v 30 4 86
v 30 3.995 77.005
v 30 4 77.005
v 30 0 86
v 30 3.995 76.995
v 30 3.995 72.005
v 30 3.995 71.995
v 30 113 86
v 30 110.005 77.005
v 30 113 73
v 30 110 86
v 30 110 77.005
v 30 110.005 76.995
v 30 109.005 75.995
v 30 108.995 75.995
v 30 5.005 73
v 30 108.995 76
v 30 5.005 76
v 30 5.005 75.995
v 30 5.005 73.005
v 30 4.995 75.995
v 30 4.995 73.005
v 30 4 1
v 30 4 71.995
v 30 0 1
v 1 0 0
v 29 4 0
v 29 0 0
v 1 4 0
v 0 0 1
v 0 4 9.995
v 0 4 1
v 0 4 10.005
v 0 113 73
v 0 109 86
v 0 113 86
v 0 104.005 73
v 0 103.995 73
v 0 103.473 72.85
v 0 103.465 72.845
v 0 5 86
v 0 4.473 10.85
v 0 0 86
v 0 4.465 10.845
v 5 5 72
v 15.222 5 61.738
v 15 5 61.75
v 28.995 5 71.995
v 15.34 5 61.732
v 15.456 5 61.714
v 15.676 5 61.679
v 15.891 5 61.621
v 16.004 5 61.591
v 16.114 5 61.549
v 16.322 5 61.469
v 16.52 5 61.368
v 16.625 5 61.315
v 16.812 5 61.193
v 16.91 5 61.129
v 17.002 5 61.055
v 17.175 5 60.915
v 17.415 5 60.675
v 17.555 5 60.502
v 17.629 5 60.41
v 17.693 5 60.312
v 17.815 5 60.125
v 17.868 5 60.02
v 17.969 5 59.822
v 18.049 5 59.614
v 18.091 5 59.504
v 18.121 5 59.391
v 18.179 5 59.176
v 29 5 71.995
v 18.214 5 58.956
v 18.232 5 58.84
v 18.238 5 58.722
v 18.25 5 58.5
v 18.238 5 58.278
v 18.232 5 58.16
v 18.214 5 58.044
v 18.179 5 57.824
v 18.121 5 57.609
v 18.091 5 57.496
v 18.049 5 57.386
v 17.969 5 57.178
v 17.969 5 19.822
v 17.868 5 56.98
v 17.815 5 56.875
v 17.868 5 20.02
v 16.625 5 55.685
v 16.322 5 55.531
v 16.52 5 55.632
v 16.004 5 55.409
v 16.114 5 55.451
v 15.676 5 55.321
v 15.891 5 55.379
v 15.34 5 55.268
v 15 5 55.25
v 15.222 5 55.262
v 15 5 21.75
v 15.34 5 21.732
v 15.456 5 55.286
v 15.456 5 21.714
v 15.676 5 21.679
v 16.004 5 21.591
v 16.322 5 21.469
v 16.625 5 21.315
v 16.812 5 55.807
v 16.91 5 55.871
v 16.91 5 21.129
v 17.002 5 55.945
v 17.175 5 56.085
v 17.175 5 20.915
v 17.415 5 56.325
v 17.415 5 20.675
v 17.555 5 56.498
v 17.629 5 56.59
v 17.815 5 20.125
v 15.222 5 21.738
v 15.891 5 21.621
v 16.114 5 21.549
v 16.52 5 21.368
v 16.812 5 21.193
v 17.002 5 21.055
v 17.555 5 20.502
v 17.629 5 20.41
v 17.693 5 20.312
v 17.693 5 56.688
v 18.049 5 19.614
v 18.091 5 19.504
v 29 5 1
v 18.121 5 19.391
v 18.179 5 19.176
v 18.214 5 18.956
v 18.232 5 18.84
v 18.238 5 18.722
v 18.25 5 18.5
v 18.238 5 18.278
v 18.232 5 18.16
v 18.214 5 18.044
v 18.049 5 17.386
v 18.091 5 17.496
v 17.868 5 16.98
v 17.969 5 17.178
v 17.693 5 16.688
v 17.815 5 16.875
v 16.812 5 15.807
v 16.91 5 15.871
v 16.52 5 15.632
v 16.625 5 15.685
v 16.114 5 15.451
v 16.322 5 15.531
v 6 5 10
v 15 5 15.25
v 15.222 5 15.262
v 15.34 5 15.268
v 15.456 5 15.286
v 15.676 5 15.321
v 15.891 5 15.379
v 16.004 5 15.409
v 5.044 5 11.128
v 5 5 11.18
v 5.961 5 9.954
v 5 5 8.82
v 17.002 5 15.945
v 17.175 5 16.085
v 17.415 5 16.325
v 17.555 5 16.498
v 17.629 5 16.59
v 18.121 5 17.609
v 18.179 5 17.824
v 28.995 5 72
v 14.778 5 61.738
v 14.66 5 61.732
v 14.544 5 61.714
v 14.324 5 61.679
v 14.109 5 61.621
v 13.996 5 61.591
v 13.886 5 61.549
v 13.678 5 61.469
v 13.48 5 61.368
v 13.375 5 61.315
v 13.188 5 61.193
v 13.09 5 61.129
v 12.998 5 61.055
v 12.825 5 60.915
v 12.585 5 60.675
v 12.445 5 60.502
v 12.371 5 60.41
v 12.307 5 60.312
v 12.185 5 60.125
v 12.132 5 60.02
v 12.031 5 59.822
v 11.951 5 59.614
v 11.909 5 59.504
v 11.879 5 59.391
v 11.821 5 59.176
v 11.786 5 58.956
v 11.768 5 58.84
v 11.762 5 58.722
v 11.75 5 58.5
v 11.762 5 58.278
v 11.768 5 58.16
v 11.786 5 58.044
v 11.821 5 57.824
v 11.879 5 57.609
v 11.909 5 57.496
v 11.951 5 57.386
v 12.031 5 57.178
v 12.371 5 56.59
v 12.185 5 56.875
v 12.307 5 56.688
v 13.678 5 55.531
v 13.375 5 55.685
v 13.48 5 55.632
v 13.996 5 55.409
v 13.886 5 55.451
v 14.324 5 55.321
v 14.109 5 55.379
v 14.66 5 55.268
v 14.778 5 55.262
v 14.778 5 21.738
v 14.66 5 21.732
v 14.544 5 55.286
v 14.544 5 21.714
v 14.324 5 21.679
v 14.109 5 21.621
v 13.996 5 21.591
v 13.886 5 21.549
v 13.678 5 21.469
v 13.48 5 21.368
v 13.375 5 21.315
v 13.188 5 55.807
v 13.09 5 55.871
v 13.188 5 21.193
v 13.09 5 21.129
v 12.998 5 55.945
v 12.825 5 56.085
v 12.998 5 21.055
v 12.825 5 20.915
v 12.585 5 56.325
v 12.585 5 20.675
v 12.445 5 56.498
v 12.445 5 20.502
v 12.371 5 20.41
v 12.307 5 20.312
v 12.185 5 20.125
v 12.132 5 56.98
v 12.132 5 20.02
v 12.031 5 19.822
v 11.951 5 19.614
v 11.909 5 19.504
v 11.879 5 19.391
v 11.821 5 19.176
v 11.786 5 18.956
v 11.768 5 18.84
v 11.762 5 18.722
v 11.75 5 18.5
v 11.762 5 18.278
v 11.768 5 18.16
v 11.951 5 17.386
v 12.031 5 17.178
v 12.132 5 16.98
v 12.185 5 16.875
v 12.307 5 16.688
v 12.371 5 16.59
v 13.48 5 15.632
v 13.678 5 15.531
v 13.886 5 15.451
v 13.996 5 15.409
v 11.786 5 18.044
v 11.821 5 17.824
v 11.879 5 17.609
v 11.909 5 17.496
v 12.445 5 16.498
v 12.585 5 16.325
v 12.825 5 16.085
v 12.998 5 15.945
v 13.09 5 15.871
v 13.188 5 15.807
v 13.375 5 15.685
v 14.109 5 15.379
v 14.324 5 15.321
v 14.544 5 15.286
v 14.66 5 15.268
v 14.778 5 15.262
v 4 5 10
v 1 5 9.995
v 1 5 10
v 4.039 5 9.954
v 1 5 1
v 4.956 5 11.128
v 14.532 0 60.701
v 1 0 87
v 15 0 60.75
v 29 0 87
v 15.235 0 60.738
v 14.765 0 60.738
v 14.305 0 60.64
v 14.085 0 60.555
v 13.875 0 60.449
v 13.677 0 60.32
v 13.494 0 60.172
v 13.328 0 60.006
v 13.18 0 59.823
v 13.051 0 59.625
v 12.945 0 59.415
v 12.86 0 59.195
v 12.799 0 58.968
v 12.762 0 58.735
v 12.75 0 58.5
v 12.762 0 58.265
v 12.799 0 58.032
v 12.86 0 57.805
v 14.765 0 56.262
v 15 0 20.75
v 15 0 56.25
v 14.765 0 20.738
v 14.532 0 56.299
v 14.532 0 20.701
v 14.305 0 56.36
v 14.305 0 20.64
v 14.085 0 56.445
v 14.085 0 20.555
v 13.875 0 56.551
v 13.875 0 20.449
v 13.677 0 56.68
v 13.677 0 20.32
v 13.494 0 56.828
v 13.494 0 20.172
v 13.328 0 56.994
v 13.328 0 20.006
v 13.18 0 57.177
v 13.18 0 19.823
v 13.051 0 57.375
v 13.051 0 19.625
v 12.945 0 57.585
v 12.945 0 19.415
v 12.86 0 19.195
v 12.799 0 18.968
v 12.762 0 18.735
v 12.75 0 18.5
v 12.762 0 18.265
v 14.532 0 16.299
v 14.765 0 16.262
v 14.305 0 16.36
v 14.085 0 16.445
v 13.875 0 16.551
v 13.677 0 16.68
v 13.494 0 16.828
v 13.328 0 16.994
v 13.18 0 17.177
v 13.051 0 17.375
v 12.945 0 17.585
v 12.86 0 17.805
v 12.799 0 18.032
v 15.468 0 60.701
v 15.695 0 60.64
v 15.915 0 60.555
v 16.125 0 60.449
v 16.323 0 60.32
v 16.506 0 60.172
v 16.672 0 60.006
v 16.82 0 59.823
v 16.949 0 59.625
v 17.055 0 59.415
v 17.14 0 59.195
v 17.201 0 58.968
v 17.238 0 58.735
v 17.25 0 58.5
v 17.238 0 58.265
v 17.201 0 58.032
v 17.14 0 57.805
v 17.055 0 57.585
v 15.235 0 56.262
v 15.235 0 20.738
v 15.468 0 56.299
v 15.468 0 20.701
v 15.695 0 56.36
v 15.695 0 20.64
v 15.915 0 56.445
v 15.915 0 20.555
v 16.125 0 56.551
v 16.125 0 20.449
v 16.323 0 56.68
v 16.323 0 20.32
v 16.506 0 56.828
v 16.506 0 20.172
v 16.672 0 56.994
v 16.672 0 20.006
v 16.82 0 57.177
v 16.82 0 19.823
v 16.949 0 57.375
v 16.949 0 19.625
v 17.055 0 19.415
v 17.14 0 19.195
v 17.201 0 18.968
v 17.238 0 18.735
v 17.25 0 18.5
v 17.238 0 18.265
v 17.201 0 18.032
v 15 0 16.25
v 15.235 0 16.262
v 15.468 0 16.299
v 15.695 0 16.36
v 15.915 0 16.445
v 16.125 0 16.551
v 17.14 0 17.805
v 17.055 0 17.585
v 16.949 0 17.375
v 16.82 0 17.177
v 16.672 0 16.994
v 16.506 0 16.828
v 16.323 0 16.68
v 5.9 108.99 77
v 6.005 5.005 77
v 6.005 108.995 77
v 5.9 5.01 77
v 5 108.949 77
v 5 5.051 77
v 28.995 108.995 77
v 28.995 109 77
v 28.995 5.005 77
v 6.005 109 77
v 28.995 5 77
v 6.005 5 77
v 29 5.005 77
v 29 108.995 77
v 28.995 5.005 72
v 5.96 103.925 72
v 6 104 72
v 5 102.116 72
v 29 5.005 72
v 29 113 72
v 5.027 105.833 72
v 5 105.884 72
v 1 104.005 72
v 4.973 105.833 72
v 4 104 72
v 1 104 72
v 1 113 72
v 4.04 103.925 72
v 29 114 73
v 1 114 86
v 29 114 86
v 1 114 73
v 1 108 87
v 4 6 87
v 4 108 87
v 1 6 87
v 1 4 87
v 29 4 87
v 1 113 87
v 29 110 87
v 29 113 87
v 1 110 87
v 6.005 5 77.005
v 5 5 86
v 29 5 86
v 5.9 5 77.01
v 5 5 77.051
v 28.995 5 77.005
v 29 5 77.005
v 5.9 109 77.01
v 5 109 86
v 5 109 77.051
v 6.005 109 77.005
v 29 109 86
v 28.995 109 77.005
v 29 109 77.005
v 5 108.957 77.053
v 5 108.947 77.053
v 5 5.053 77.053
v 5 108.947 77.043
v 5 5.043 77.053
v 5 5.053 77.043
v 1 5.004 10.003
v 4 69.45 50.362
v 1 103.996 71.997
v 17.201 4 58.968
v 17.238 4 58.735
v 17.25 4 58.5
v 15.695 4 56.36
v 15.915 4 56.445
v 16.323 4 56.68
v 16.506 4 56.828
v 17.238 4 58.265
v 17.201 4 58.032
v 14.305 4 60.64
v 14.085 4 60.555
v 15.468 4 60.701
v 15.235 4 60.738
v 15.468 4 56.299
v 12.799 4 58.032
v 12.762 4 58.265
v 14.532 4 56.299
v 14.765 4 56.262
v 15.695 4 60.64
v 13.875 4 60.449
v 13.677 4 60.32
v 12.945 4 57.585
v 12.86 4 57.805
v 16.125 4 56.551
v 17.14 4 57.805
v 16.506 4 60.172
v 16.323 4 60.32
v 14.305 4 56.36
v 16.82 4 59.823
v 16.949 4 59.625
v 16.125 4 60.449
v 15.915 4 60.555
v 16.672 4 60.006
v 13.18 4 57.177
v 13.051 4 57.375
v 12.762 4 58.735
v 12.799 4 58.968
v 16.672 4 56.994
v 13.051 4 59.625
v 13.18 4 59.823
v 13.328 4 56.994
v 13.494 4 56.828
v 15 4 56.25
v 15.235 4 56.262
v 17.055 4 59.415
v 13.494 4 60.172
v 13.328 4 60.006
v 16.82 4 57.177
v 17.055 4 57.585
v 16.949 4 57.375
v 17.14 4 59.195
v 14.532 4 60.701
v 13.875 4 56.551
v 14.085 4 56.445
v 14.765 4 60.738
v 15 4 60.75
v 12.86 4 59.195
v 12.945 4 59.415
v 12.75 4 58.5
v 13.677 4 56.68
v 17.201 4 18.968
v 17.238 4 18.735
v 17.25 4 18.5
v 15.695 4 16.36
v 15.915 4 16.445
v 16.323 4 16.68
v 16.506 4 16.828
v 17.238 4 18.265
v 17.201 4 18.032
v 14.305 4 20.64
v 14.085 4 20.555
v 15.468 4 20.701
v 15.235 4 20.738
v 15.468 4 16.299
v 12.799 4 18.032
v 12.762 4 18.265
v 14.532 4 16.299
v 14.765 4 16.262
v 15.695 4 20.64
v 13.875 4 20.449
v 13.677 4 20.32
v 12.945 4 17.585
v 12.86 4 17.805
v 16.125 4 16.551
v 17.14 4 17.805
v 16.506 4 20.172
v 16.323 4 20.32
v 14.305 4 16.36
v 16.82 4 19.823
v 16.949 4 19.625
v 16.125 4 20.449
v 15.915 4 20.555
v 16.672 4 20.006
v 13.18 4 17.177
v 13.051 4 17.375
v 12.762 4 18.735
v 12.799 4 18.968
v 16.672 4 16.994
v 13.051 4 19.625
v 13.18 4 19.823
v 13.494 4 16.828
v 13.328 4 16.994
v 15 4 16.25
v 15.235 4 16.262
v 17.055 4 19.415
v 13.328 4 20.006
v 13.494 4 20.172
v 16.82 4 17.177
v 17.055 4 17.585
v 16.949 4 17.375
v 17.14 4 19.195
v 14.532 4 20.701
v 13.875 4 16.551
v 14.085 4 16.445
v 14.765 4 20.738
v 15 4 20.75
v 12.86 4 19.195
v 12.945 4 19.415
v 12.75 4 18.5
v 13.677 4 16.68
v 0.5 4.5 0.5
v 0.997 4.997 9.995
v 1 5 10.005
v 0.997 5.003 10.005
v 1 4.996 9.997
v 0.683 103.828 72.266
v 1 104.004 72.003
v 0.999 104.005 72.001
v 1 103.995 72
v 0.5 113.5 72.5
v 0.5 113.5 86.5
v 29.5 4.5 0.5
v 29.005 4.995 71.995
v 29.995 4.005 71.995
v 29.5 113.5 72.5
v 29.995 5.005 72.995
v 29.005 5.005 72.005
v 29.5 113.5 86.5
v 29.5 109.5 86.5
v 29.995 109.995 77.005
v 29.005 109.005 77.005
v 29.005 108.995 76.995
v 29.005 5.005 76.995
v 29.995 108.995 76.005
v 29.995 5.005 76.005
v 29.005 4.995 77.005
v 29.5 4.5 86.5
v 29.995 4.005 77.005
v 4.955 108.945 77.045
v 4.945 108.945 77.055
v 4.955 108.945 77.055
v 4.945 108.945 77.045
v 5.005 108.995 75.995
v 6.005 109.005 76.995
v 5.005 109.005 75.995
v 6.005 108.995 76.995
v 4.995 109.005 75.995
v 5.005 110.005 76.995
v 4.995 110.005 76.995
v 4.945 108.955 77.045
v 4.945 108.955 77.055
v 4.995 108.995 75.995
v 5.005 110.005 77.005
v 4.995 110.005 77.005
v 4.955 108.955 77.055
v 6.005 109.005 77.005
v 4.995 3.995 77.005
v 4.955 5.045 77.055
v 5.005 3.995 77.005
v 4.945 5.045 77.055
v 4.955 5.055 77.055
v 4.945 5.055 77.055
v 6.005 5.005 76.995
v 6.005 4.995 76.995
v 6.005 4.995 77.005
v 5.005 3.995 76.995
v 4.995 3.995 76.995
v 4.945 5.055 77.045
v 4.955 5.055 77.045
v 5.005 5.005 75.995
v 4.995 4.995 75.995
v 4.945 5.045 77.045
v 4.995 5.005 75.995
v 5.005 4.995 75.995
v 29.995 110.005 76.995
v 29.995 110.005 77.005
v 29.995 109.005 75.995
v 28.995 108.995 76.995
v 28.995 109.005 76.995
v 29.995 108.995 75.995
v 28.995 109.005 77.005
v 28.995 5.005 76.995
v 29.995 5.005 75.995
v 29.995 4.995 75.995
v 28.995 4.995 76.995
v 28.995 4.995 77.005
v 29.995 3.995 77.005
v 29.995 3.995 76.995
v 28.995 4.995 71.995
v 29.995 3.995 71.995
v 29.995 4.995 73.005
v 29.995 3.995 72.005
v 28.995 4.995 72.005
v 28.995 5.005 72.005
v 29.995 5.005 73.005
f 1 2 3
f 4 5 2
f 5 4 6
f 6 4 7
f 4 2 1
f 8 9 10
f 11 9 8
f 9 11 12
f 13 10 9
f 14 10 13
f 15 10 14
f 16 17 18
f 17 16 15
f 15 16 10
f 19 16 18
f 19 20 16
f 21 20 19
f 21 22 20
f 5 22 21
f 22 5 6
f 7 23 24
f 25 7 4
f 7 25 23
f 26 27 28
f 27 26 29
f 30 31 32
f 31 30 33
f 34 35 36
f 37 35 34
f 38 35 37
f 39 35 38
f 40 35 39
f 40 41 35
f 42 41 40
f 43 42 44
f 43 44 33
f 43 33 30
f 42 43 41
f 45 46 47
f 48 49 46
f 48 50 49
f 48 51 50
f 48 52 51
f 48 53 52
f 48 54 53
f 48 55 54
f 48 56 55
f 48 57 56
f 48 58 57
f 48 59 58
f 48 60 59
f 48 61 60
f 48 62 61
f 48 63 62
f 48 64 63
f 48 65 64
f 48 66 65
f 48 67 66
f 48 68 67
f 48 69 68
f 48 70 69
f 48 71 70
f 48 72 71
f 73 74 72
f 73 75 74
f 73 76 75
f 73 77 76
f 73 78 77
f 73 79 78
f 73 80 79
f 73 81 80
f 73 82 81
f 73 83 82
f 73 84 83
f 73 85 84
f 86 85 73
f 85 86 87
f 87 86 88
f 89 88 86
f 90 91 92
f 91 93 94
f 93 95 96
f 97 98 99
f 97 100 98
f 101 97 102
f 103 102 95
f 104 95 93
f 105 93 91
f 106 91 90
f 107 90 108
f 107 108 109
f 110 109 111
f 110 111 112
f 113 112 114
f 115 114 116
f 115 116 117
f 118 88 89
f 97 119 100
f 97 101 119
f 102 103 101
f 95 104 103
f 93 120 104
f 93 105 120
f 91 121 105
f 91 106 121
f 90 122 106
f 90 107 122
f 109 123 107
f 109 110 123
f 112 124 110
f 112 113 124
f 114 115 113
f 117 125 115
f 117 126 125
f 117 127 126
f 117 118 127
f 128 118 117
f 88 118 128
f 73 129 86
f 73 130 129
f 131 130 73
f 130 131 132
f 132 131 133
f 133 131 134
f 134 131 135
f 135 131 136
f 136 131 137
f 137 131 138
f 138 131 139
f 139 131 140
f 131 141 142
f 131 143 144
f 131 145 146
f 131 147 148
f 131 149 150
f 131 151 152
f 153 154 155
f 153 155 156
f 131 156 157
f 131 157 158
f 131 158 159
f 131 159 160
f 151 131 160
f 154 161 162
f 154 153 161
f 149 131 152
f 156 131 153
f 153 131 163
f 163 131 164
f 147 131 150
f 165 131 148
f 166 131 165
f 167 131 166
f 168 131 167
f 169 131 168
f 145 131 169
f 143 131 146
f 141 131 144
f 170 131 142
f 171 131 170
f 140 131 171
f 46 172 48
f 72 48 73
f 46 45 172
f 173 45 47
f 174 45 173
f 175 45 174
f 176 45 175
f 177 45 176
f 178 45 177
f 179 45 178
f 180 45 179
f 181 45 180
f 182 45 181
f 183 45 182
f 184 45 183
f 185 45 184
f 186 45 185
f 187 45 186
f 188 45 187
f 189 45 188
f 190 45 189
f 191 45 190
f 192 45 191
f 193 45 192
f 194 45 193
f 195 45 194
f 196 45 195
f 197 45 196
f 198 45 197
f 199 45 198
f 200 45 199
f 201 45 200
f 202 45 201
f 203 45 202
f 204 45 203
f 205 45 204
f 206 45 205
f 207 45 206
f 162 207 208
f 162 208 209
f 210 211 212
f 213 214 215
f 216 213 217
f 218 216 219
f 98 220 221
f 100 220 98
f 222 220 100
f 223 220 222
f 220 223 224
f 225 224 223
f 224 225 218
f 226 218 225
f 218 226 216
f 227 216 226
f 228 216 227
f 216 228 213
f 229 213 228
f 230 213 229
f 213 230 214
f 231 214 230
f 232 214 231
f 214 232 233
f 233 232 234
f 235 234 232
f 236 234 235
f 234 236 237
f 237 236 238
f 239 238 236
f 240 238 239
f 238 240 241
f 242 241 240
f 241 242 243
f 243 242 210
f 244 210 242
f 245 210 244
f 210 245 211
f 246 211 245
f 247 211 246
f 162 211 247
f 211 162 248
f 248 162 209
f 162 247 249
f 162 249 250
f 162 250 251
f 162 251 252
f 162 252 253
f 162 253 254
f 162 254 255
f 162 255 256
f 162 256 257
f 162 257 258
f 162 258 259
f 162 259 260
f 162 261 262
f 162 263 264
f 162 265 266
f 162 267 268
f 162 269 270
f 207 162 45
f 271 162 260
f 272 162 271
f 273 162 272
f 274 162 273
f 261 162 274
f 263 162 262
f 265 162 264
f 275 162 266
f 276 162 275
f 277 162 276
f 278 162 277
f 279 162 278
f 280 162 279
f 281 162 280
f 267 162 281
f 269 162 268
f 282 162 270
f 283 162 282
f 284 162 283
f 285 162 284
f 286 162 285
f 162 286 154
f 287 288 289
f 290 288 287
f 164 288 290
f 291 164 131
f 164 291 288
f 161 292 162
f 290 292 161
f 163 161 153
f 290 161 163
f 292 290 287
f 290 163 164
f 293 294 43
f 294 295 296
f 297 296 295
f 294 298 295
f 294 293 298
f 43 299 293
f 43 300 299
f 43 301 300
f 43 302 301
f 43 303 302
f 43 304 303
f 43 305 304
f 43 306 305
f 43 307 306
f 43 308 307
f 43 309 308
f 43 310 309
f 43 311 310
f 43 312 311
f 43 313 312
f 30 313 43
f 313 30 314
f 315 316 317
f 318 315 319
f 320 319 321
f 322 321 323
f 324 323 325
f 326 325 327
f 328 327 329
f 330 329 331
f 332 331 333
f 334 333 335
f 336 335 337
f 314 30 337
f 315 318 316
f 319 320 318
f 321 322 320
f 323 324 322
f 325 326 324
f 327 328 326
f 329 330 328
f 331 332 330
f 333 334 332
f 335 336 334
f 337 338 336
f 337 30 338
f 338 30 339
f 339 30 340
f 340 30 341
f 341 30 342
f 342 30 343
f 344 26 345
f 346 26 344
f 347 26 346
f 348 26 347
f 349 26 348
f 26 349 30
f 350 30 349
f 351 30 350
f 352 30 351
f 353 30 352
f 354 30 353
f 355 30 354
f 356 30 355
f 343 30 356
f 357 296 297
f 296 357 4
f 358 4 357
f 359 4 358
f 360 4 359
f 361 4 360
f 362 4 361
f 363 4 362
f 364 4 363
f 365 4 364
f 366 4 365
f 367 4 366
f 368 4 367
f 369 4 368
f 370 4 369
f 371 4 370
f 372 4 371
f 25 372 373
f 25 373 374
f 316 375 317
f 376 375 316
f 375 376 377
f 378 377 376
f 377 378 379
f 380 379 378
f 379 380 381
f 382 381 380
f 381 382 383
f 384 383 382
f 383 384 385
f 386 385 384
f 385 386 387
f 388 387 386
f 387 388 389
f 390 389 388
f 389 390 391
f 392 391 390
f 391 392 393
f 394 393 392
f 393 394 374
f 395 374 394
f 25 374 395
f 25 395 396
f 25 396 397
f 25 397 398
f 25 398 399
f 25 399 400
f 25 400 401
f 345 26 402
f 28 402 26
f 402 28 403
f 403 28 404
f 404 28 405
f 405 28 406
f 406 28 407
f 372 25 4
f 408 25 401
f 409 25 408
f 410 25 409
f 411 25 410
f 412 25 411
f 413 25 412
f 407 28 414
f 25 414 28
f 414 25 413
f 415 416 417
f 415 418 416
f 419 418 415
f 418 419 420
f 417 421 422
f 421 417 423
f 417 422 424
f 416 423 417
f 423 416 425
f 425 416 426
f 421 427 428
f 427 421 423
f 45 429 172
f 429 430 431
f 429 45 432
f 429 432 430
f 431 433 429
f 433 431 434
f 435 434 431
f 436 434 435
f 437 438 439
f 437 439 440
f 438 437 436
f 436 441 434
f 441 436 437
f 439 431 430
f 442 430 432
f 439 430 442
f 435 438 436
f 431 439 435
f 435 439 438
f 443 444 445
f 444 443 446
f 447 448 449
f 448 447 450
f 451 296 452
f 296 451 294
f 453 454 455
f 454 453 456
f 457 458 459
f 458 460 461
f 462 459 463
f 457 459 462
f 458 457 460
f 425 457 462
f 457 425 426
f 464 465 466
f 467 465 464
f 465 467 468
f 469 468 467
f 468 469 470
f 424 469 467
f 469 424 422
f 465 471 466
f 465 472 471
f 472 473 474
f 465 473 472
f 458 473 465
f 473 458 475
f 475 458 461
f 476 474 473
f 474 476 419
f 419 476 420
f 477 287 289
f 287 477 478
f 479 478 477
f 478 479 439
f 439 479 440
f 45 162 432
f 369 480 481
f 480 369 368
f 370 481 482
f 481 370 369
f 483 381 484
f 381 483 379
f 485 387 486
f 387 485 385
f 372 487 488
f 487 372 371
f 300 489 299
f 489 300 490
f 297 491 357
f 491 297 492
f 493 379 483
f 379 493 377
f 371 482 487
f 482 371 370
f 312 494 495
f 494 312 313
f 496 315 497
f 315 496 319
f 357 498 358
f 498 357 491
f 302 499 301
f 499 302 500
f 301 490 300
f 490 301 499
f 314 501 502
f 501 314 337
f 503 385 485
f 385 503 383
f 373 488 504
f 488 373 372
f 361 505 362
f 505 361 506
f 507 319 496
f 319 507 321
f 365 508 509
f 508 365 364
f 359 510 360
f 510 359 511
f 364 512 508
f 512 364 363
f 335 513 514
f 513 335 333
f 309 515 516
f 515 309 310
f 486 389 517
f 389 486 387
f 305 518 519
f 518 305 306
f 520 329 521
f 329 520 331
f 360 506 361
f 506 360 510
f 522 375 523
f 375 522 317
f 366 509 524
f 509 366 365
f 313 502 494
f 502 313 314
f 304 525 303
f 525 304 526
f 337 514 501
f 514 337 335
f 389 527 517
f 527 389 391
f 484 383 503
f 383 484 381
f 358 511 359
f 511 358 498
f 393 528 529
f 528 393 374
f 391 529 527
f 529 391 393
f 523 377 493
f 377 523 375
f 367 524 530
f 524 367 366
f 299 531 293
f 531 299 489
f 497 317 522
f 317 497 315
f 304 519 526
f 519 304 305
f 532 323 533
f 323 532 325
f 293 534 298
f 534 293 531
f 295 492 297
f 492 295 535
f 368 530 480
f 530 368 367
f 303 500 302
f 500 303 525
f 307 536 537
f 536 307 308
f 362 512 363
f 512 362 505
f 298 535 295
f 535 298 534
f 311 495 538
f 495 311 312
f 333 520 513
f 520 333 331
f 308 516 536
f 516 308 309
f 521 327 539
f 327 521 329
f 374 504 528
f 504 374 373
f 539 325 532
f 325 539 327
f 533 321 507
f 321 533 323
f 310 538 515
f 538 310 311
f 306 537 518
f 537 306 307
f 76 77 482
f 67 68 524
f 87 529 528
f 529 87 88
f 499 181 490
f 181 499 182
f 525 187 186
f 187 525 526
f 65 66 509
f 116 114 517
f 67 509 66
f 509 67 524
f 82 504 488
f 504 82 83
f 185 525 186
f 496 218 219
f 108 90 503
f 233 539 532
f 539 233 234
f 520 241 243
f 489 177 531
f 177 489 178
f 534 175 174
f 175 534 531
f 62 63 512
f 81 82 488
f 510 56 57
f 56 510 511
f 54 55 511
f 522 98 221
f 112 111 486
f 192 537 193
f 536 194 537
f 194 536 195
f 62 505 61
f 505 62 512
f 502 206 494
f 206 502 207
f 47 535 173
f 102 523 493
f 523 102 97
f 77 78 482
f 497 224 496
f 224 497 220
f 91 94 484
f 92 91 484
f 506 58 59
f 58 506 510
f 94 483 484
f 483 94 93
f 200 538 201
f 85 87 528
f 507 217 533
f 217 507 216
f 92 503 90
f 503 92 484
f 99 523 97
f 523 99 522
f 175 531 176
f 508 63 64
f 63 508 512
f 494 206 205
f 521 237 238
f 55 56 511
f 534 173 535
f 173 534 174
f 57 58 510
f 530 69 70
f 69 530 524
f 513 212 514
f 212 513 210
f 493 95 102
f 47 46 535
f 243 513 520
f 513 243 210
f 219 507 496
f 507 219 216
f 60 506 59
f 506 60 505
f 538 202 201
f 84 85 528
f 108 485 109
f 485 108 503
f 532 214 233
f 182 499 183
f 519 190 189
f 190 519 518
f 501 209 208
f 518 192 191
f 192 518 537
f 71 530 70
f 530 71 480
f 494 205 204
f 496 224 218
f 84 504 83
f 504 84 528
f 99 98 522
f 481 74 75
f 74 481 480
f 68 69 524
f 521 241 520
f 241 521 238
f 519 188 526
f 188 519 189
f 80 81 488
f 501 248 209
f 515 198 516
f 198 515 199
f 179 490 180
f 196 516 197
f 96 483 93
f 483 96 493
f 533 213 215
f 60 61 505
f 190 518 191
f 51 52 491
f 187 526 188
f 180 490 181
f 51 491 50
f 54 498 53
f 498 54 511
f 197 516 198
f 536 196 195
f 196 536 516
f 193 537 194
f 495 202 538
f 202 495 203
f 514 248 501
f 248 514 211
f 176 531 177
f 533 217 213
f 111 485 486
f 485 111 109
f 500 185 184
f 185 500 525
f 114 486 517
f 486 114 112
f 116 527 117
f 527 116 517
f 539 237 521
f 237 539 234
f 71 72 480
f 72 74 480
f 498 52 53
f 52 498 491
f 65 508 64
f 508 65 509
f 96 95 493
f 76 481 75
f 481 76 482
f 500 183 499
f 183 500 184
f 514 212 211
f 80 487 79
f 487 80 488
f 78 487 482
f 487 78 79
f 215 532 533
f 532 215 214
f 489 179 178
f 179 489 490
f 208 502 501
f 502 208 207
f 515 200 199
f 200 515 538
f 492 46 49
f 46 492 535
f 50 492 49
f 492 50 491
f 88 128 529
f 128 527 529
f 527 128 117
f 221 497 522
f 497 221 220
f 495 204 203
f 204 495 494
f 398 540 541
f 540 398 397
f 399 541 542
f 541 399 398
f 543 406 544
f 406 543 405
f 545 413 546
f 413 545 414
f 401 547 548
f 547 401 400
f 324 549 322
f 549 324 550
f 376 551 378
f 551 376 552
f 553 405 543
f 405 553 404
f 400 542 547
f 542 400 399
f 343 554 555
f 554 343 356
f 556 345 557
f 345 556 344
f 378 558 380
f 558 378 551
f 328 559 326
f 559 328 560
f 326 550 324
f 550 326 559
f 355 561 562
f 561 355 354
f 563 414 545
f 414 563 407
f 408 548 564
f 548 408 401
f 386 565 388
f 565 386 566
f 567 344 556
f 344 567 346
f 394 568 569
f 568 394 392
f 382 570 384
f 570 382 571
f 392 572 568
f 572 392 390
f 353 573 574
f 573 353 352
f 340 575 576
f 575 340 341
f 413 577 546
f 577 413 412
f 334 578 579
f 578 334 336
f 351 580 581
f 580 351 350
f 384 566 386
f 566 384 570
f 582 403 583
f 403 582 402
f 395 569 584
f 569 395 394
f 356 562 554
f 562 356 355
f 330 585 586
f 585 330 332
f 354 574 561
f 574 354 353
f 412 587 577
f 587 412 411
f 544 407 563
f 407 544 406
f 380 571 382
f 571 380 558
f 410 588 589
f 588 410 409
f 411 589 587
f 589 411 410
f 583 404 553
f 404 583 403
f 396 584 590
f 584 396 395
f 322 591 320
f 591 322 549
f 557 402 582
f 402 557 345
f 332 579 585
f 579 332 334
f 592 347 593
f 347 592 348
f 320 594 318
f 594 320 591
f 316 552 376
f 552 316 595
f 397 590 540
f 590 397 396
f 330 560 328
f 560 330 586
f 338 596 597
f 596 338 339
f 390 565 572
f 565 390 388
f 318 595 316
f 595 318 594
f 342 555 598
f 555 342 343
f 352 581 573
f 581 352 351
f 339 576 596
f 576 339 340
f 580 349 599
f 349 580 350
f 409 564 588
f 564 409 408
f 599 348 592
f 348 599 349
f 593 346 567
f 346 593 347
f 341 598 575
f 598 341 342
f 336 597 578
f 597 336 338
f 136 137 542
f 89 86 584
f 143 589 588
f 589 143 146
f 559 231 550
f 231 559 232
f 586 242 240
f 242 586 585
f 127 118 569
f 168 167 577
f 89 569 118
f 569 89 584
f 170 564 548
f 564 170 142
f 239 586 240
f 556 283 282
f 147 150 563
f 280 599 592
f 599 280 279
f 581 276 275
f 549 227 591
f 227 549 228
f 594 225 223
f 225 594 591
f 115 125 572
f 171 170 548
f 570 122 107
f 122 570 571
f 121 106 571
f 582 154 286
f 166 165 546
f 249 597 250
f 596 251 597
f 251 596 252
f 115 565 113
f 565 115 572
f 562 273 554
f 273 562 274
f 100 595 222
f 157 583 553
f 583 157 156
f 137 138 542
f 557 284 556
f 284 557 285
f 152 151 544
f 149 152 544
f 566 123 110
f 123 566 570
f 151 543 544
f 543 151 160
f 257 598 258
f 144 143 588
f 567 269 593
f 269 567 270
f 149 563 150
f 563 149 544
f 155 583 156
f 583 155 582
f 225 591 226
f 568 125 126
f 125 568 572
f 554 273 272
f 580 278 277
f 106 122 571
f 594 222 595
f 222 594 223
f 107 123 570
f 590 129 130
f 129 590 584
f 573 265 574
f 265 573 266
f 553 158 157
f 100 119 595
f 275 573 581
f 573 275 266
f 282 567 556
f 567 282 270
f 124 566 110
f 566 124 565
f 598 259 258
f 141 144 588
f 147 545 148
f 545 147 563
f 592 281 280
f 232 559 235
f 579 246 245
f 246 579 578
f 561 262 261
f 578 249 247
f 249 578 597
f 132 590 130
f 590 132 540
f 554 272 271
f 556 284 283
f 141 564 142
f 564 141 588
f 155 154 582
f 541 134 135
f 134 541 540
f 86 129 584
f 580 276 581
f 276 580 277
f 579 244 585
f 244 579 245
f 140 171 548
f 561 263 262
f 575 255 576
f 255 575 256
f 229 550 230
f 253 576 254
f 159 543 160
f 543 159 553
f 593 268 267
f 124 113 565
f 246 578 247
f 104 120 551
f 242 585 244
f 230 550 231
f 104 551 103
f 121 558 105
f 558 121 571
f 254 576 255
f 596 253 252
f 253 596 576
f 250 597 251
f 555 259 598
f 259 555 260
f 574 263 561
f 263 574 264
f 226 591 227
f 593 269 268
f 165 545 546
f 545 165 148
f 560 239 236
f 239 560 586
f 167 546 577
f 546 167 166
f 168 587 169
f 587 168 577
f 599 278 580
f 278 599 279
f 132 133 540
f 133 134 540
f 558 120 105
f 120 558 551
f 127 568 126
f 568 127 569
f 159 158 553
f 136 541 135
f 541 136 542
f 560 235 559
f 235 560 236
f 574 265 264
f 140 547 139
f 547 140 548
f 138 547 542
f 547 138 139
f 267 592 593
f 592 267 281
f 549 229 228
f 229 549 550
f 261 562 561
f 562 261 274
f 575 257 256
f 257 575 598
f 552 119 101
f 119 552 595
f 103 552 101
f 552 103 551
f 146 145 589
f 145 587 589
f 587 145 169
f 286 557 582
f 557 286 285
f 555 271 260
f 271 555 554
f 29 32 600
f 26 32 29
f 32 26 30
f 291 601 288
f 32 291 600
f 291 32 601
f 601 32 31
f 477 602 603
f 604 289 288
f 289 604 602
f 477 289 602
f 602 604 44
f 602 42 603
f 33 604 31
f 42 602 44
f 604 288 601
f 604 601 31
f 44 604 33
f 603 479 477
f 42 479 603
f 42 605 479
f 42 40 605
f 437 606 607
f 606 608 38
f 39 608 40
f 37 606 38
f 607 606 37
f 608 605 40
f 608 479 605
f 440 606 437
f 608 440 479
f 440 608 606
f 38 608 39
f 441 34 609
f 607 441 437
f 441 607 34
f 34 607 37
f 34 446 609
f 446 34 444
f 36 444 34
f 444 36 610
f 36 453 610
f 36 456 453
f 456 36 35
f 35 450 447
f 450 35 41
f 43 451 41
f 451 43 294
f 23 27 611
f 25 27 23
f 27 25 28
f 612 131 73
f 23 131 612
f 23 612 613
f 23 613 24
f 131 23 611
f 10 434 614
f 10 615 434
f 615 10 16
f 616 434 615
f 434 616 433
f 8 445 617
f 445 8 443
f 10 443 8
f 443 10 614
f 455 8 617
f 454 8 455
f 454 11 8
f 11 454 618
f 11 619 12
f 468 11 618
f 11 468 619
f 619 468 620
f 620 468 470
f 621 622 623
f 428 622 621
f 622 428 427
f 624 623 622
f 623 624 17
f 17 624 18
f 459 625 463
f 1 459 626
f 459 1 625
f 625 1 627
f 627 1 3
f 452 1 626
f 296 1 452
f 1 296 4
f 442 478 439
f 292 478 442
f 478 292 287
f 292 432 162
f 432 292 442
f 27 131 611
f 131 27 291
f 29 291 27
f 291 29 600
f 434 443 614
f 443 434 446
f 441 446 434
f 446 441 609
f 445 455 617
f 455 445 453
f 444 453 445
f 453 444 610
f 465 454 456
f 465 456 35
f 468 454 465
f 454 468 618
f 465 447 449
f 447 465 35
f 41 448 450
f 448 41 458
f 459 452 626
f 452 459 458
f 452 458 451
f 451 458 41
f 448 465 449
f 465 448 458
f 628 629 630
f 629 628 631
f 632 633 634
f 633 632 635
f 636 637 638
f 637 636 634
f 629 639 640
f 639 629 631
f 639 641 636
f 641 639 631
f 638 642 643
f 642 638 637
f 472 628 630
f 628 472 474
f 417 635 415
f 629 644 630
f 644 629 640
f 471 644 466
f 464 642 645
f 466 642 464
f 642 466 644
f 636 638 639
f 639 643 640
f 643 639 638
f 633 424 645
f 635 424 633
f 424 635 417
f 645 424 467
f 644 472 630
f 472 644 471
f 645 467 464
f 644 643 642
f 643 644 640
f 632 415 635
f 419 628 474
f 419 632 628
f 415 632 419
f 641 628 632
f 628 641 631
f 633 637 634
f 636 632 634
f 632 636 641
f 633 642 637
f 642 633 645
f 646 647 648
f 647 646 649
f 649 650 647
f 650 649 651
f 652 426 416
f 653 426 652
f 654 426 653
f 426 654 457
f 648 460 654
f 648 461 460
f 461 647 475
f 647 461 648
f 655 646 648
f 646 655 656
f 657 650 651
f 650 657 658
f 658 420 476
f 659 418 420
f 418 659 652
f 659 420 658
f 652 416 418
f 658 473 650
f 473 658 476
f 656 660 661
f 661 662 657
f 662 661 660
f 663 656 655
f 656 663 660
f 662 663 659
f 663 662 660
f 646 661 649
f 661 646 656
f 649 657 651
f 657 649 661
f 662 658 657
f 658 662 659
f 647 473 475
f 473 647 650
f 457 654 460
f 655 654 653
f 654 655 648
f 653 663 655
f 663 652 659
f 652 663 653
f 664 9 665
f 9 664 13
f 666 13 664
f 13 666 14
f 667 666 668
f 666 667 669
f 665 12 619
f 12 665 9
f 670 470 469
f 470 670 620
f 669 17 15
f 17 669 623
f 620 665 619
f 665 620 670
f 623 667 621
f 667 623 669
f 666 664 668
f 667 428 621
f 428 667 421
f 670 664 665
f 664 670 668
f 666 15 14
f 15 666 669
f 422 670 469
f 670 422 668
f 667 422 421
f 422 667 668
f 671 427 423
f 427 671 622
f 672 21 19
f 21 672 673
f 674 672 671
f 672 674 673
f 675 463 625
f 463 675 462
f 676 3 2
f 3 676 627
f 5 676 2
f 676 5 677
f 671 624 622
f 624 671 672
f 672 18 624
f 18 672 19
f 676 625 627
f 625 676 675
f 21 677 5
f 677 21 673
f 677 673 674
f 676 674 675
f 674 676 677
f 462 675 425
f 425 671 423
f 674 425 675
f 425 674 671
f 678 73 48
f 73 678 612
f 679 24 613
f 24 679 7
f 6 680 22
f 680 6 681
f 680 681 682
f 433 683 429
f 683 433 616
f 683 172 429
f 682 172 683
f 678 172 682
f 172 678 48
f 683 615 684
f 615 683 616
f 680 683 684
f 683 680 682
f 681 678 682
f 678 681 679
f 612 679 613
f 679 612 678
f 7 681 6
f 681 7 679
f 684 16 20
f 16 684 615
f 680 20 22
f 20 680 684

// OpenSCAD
// ====================================================================
// Bambu Lab AMS HT Wall Mount Bracket
// Version: v0.28
// Description: Parametric wall mount bracket for Bambu Lab AMS HT unit.
//              Two identical brackets form a side-wall mounting platform.
// Fixes (v0.28): Added a side retaining lip along the gusset side (X=0)
//                with matching height (10mm) and thickness (5mm) to 
//                prevent sideways movement of the AMS HT unit.
// ====================================================================

/* [Layout Options] */
// Which bracket(s) to render for the build plate
render_layout = "left"; // ["left": Left Bracket, "right": Right Bracket, "pair": Both Brackets]

/* [Wall Mounting Parameters] */
// Center-to-center vertical distance between screws (e.g., 40 or 80 for grid plate)
screw_spacing = 40; // [40, 80]

// Wood screw shank diameter (pass-through hole)
screw_hole_diam = 4.5; 

// Wood screw countersink head diameter
countersink_diam = 8.5; 

// Countersink depth angle in degrees (standard 90 deg wood screw)
countersink_angle = 90; 

/* [Platform & AMS HT Dimensions] */
// Width of the support arm platform (mm)
arm_width = 30.0; 

// Width of the bottom base of AMS HT that sits between notches (mm)
ams_base_width = 103.0; 

// Extra tolerance/fit clearance between notches (mm)
fit_clearance = 1.0; 

// Thickness of the horizontal support platform (mm)
platform_thickness = 5.0; 

/* [Notch / Retaining Lip Parameters] */
// Height of front outer retaining lip above platform (mm)
outer_notch_height = 10.0; 

// Thickness of front outer retaining lip (mm)
outer_notch_thickness = 5.0; 

// Height of rear wall-side notch above platform (mm)
rear_notch_height = 10.0; 

// Thickness of rear wall-side notch (mm)
rear_notch_thickness = 5.0; 

// Height of side retaining lip above platform (mm)
side_lip_height = 10.0;

// Thickness of side retaining lip (mm)
side_lip_thickness = 5.0;

/* [Bracket Structure Parameters] */
// Thickness of the vertical plate attached to the wall (mm)
wall_plate_thickness = 5.0; 

// Thickness of the diagonal structural support rib (mm)
gusset_thickness = 5.0; 

// Chamfer size for all non-wall-facing outer edges (mm)
chamfer_size = 1.0;

/* [Hidden] */
$fn = 60; // Smooth curves resolution

// Dynamic platform depth between notches
platform_depth = ams_base_width + fit_clearance;

// Calculate total height needed for wall plate based on screw spacing
wall_plate_height = screw_spacing + (countersink_diam * 2) + 20;

// Total depth trimmed to end flush at the front edge of the outward notch
total_arm_depth = rear_notch_thickness + platform_depth + outer_notch_thickness;

// --- Main Layout Rendering ---
if (render_layout == "left") {
    ams_ht_bracket();
} else if (render_layout == "right") {
    mirror([1, 0, 0]) ams_ht_bracket();
} else {
    // Render side-by-side mirrored pair
    translate([-arm_width - 10, 0, 0]) ams_ht_bracket();
    translate([10, 0, 0]) mirror([1, 0, 0]) ams_ht_bracket();
}

// --- Modules ---

module ams_ht_bracket() {
    difference() {
        // 1. Base Solid Geometry
        union() {
            // Vertical Wall Plate
            translate([0, 0, 0])
                cube([arm_width, wall_plate_thickness, wall_plate_height]);
            
            // Horizontal Support Arm
            translate([0, 0, wall_plate_height - platform_thickness])
                cube([arm_width, total_arm_depth, platform_thickness]);
            
            // Rear Wall-Side Notch (flush with wall side y=0)
            translate([0, 0, wall_plate_height - platform_thickness])
                cube([arm_width, rear_notch_thickness, platform_thickness + rear_notch_height]);

            // Front Outer Retaining Lip
            translate([0, total_arm_depth - outer_notch_thickness, wall_plate_height - platform_thickness])
                cube([arm_width, outer_notch_thickness, platform_thickness + outer_notch_height]);

            // Side Retaining Lip (on diagonal support side X=0)
            translate([0, 0, wall_plate_height - platform_thickness])
                cube([side_lip_thickness, total_arm_depth, platform_thickness + side_lip_height]);

            // Structural Diagonal Gusset (placed on Left side X=0)
            translate([0, wall_plate_thickness, 0])
                rotate([90, 0, 90])
                    linear_extrude(height = gusset_thickness)
                        polygon(points = [
                            [0, 10], // Moved 10mm up the wall plate
                            [total_arm_depth - wall_plate_thickness - 10, wall_plate_height - platform_thickness], // Moved 10mm back from the front
                            [0, wall_plate_height - platform_thickness]
                        ]);
        }

        // 2. Countersunk Screwholes
        translate([arm_width / 2, wall_plate_thickness + 1, wall_plate_height / 2 + screw_spacing / 2])
            rotate([90, 0, 0])
                screw_hole_subtraction();

        translate([arm_width / 2, wall_plate_thickness + 1, wall_plate_height / 2 - screw_spacing / 2])
            rotate([90, 0, 0])
                screw_hole_subtraction();
                
        // 3. Precise Edge Chamfer Subtractions
        chamfer_cutters();
    }
}

// Applies explicit edge subtractions along the model's outer profile
module chamfer_cutters() {
    wp_z = wall_plate_height;
    total_y = total_arm_depth;
    c = chamfer_size;
    
    // X-Aligned Edge Chamfers (Horizontal edges across the bracket)
    translate([0, 5, 0]) edge_cutter_x(arm_width, c);
    translate([0, total_y, wp_z - platform_thickness]) edge_cutter_x(arm_width, c);
    
    translate([0, total_y, wp_z + outer_notch_height]) edge_cutter_x(arm_width, c);
    translate([0, total_y - outer_notch_thickness, wp_z + outer_notch_height]) edge_cutter_x(arm_width, c);
    translate([0, 5, wp_z + rear_notch_height]) edge_cutter_x(arm_width, c);
    
    // Execute side chamfer trace for Left Outer Face (X=0)
    translate([0, 0, 0]) {
        edge_cutter_segment([0, 0], [5, 0], c);
        
        edge_cutter_segment([5, 0], [5, 10], c, 1, 0); 
        
        // Precision Miter Joint to fix the inner corner gouge on outer profile
        edge_cutter_joint([5, 10], [5, 0], [total_y - 10, wp_z - platform_thickness], c);
        
        edge_cutter_segment([5, 10], [total_y - 10, wp_z - platform_thickness], c, 0, 0);
        
        // Precision Miter Joint for top platform corner
        edge_cutter_joint([total_y - 10, wp_z - platform_thickness], [5, 10], [total_y, wp_z - platform_thickness], c);
        
        edge_cutter_segment([total_y - 10, wp_z - platform_thickness], [total_y, wp_z - platform_thickness], c, 0, 1);
        
        // Front vertical edge leading to top of side lip
        edge_cutter_segment([total_y, wp_z - platform_thickness], [total_y, wp_z + side_lip_height], c);
        
        // Continuous top outer chamfer along the full side lip
        edge_cutter_segment([total_y, wp_z + side_lip_height], [5, wp_z + side_lip_height], c);
        
        edge_cutter_segment([5, wp_z + side_lip_height], [0, wp_z + side_lip_height], c);
    }
    
    // Chamfer on the inner top edge of the side lip (at X = side_lip_thickness)
    translate([side_lip_thickness, 0, 0])
        edge_cutter_segment(
            [total_y - outer_notch_thickness, wp_z + side_lip_height], 
            [rear_notch_thickness, wp_z + side_lip_height], 
            c, 0, 0
        );

    // Execute side chamfer trace for Right Face (X=arm_width)
    translate([arm_width, 0, 0]) {
        edge_cutter_segment([0, 0], [5, 0], c);
        
        edge_cutter_segment([5, 0], [5, wp_z - platform_thickness], c, 1, 0);
        edge_cutter_segment([5, wp_z - platform_thickness], [total_y, wp_z - platform_thickness], c, 0, 1);
        
        edge_cutter_segment([total_y, wp_z - platform_thickness], [total_y, wp_z + outer_notch_height], c);
        edge_cutter_segment([total_y, wp_z + outer_notch_height], [total_y - outer_notch_thickness, wp_z + outer_notch_height], c);
        
        edge_cutter_segment(
            [total_y - outer_notch_thickness, wp_z + outer_notch_height], 
            [total_y - outer_notch_thickness, wp_z], 
            c, 1, 0
        );
        
        edge_cutter_segment(
            [total_y - outer_notch_thickness, wp_z], 
            [5, wp_z], 
            c, 0, 0
        );
        
        edge_cutter_segment(
            [5, wp_z], 
            [5, wp_z + rear_notch_height], 
            c, 0, 1
        );
        
        edge_cutter_segment([5, wp_z + rear_notch_height], [0, wp_z + rear_notch_height], c);
    }
    
    // Chamfer the inner diagonal edge of the gusset (at X=gusset_thickness)
    intersection() {
        translate([gusset_thickness, 0, 0]) 
            edge_cutter_segment([5, 10], [total_y - 10, wp_z - platform_thickness], c, 5, 5); 
            
        translate([-10, 5, -50]) 
            cube([arm_width + 20, total_y + 50, wp_z - platform_thickness + 50]);
    }
        
    // --- 3D Miter Corner Subtractions ---
    // Left Inner Miters (shifted inward to X = side_lip_thickness)
    inner_corner_miter([total_y - outer_notch_thickness, wp_z], c, false, 1, -1, x_pos = side_lip_thickness);  // Front Top
    inner_corner_miter([5, wp_z], c, false, -1, -1, x_pos = side_lip_thickness);                               // Rear Top
    
    // Right Face Inner Miters
    inner_corner_miter([total_y - outer_notch_thickness, wp_z], c, true, 1, -1);   // Front Top
    inner_corner_miter([5, wp_z], c, true, -1, -1);                                // Rear Top
    inner_corner_miter([5, wp_z - platform_thickness], c, true, -1, 1);            // Rear Bottom (wall plate to arm)
}

// Connects two chamfer segments cleanly at a corner to prevent gouging or spikes
module edge_cutter_joint(p, p_prev, p_next, c) {
    ang1 = atan2(p[1] - p_prev[1], p[0] - p_prev[0]);
    ang2 = atan2(p_next[1] - p[1], p_next[0] - p[0]);
    
    hull() {
        translate([0, p[0], p[1]]) rotate([ang1, 0, 0]) rotate([0, 0, 90]) rotate([45, 0, 0]) translate([-0.005, -c/sqrt(2), -c/sqrt(2)]) cube([0.01, c * sqrt(2), c * sqrt(2)]);
        translate([0, p[0], p[1]]) rotate([ang2, 0, 0]) rotate([0, 0, 90]) rotate([45, 0, 0]) translate([-0.005, -c/sqrt(2), -c/sqrt(2)]) cube([0.01, c * sqrt(2), c * sqrt(2)]);
    }
}

// Subtraction module that cleanly bridges square-ended chamfers using a diagonal plane
module inner_corner_miter(p, c, is_right, dir_y, dir_z=-1, x_pos=-1) {
    x = (x_pos >= 0) ? x_pos : (is_right ? arm_width : 0);
    x_dir = is_right ? -1 : 1;
    
    translate([x, p[0], p[1]])
        scale([x_dir, 1, 1])
        hull() {
            translate([-0.05, -dir_y*0.05, -dir_z*0.05]) cube(0.01, center=true);
            translate([c, 0, 0]) cube(0.01, center=true);
            translate([0, dir_y * c, 0]) cube(0.01, center=true);
            translate([0, 0, dir_z * c]) cube(0.01, center=true);
        }
}

// Places a chamfer cutting diamond along any 2D coordinate segment in the YZ plane
module edge_cutter_segment(p1, p2, c, os1=1, os2=1) {
    l = norm(p2 - p1);
    ang = atan2(p2[1] - p1[1], p2[0] - p1[0]);
    translate([0, p1[0], p1[1]])
        rotate([ang, 0, 0])
        rotate([0, 0, 90])
        edge_cutter_x(l, c, os1, os2);
}

// Base shape for shaving a perfect 45-degree chamfer off a straight edge
module edge_cutter_x(l, c, os1=1, os2=1) {
    rotate([45, 0, 0])
        translate([-os1, -c/sqrt(2), -c/sqrt(2)])
        cube([l + os1 + os2, c * sqrt(2), c * sqrt(2)]);
}

// Subtraction module for wood screw with countersink head
module screw_hole_subtraction() {
    countersink_height = (countersink_diam - screw_hole_diam) / (2 * tan(countersink_angle / 2));
    
    union() {
        cylinder(h = wall_plate_thickness + 5, d = screw_hole_diam);
        cylinder(h = countersink_height, d1 = countersink_diam, d2 = screw_hole_diam);
    }
}
